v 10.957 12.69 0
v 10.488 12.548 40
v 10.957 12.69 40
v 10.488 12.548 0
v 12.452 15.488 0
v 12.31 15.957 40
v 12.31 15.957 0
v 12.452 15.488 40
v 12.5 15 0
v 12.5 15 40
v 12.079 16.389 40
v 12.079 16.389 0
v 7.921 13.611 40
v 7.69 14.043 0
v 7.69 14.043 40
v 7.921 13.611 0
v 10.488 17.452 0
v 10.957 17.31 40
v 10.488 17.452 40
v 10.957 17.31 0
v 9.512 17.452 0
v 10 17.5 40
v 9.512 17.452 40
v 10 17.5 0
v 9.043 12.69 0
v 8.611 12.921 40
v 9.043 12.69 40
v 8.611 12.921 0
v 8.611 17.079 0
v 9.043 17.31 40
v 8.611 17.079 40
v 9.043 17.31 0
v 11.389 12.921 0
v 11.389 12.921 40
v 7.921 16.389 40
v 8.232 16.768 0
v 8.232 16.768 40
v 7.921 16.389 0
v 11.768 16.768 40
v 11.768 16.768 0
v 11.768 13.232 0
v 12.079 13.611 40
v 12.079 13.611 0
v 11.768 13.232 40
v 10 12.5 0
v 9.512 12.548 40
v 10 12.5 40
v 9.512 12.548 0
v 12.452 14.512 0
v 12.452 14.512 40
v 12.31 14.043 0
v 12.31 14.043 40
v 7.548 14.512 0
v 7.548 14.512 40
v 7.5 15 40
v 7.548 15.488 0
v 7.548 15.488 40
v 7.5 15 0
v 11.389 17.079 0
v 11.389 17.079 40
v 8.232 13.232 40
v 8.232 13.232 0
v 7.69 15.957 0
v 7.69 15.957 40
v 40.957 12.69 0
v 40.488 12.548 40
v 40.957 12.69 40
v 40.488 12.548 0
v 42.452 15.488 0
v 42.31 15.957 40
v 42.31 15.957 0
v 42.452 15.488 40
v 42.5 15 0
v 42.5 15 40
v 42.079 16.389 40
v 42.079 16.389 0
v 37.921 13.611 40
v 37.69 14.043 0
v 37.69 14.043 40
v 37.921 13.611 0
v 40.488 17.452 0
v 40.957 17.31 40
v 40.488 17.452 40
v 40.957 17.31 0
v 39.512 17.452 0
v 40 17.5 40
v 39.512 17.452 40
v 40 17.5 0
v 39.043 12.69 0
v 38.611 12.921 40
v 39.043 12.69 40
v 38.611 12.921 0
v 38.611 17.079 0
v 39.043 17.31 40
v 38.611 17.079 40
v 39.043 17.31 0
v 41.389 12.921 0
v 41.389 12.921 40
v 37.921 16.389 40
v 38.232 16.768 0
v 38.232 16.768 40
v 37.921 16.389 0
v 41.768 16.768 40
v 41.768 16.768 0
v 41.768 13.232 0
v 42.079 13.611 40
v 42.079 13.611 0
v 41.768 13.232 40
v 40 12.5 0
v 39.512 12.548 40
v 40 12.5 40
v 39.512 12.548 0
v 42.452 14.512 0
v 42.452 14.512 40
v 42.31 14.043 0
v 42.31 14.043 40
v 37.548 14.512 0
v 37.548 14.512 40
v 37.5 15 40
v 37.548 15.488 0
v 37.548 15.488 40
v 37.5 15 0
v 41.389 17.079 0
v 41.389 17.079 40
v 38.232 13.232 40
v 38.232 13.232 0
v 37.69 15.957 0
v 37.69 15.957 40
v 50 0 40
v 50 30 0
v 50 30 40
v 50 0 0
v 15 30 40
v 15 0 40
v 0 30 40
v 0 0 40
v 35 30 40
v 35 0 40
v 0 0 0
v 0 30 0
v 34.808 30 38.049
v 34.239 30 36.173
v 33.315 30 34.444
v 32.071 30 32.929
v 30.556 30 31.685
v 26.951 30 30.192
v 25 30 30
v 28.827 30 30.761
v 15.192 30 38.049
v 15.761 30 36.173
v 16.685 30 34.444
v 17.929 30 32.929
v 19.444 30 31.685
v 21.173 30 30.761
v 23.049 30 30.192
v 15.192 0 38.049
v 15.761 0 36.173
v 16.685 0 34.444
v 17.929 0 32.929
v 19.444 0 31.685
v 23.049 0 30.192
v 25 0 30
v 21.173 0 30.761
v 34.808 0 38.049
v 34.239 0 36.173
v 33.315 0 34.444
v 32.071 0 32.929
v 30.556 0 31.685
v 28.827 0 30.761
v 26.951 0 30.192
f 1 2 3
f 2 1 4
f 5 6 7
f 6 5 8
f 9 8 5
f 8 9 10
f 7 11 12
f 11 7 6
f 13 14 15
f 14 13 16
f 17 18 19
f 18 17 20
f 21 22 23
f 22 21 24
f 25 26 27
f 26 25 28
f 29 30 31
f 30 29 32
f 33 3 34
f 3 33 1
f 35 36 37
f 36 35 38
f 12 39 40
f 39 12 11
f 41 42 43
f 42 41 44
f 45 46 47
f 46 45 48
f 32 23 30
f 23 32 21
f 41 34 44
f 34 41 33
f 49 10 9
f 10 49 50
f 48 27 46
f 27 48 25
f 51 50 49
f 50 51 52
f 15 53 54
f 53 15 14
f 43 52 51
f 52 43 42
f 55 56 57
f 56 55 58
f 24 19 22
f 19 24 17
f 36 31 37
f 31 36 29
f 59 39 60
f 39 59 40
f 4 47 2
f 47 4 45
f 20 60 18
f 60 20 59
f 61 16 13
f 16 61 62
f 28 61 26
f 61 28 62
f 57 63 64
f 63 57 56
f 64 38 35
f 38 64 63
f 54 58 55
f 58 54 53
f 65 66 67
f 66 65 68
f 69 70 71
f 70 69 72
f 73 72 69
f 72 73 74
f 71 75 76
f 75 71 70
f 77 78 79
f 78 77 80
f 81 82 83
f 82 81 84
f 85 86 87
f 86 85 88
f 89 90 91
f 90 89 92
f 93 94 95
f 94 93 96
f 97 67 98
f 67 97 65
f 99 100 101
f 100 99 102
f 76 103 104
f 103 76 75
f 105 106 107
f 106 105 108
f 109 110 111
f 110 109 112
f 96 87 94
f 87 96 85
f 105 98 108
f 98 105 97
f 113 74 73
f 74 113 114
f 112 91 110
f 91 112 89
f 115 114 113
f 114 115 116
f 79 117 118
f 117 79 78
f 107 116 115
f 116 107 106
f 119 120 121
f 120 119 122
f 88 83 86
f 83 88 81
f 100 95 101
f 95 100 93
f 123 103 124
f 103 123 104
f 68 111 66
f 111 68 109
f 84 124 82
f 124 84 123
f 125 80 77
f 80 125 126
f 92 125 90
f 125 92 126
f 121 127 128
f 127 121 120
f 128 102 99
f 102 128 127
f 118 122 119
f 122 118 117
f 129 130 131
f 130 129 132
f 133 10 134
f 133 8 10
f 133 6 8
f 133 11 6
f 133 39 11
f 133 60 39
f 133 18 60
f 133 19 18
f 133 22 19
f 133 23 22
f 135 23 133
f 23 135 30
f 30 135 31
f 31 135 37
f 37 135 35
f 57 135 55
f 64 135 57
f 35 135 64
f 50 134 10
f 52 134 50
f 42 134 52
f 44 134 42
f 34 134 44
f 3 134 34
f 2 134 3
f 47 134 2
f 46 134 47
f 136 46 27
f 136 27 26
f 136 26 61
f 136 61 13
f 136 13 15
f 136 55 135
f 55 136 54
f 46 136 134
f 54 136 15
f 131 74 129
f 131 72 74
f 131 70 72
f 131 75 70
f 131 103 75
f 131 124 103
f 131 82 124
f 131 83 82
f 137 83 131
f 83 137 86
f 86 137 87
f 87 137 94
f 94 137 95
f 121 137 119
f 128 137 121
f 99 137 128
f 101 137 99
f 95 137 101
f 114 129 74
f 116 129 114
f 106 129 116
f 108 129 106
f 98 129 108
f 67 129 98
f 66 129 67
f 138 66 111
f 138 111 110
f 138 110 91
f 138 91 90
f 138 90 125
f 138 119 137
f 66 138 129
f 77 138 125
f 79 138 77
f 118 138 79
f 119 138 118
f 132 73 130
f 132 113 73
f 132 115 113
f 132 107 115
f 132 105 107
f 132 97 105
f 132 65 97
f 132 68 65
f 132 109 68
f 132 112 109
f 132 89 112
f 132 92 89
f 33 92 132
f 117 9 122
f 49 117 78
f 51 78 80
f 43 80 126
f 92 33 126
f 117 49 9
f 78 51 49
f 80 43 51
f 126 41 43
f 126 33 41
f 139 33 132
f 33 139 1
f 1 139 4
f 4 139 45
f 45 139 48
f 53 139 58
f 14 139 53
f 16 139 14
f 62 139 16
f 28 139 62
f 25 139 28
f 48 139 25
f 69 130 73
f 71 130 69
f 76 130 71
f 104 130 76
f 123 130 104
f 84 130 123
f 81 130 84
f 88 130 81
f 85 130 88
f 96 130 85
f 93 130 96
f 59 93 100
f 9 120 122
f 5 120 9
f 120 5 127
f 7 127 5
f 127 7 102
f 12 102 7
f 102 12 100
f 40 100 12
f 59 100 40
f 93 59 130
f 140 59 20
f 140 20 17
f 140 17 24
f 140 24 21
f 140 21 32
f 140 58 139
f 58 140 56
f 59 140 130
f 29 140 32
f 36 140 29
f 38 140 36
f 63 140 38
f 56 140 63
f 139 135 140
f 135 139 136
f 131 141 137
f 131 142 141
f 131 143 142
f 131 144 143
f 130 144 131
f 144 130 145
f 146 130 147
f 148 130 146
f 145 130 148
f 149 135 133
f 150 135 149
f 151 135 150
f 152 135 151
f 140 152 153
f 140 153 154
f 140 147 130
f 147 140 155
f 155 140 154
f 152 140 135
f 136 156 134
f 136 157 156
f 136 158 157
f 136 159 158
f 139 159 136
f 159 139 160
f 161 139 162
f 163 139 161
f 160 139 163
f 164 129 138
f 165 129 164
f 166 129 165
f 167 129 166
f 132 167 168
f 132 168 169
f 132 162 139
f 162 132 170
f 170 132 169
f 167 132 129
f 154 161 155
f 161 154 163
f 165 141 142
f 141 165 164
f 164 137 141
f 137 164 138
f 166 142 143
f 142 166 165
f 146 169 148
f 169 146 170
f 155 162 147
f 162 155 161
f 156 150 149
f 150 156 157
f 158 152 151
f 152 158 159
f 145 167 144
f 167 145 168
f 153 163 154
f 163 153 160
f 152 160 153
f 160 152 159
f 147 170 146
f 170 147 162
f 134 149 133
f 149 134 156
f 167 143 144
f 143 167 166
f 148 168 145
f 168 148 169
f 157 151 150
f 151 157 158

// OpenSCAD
$fn = 32;

// ----------------------------------------------------------------------
// Saddle clamp: plain shaft clamp
// ----------------------------------------------------------------------

// --- parameters (mm) ---
blk_l = 50;               // block length, X
blk_w = 30;               // block width, Y
blk_h = 40;               // block height
clamp_r = 10;             // shaft groove radius
hole_r = 2.5;             // bolt hole radius
hole_m = 10;              // bolt hole margin from the ends

saw_depth = clamp_r + 3;  // saw kerf depth

difference() {
  cube([blk_l, blk_w, blk_h]);
  translate([blk_l / 2, -1, blk_h])
    rotate([-90, 0, 0])
      cylinder(h = blk_w + 2, r = clamp_r);
  for (sx = [0, 1])
    translate([sx ? blk_l - hole_m : hole_m, blk_w / 2, -1])
      cylinder(r = hole_r, h = blk_h + 2);
}
